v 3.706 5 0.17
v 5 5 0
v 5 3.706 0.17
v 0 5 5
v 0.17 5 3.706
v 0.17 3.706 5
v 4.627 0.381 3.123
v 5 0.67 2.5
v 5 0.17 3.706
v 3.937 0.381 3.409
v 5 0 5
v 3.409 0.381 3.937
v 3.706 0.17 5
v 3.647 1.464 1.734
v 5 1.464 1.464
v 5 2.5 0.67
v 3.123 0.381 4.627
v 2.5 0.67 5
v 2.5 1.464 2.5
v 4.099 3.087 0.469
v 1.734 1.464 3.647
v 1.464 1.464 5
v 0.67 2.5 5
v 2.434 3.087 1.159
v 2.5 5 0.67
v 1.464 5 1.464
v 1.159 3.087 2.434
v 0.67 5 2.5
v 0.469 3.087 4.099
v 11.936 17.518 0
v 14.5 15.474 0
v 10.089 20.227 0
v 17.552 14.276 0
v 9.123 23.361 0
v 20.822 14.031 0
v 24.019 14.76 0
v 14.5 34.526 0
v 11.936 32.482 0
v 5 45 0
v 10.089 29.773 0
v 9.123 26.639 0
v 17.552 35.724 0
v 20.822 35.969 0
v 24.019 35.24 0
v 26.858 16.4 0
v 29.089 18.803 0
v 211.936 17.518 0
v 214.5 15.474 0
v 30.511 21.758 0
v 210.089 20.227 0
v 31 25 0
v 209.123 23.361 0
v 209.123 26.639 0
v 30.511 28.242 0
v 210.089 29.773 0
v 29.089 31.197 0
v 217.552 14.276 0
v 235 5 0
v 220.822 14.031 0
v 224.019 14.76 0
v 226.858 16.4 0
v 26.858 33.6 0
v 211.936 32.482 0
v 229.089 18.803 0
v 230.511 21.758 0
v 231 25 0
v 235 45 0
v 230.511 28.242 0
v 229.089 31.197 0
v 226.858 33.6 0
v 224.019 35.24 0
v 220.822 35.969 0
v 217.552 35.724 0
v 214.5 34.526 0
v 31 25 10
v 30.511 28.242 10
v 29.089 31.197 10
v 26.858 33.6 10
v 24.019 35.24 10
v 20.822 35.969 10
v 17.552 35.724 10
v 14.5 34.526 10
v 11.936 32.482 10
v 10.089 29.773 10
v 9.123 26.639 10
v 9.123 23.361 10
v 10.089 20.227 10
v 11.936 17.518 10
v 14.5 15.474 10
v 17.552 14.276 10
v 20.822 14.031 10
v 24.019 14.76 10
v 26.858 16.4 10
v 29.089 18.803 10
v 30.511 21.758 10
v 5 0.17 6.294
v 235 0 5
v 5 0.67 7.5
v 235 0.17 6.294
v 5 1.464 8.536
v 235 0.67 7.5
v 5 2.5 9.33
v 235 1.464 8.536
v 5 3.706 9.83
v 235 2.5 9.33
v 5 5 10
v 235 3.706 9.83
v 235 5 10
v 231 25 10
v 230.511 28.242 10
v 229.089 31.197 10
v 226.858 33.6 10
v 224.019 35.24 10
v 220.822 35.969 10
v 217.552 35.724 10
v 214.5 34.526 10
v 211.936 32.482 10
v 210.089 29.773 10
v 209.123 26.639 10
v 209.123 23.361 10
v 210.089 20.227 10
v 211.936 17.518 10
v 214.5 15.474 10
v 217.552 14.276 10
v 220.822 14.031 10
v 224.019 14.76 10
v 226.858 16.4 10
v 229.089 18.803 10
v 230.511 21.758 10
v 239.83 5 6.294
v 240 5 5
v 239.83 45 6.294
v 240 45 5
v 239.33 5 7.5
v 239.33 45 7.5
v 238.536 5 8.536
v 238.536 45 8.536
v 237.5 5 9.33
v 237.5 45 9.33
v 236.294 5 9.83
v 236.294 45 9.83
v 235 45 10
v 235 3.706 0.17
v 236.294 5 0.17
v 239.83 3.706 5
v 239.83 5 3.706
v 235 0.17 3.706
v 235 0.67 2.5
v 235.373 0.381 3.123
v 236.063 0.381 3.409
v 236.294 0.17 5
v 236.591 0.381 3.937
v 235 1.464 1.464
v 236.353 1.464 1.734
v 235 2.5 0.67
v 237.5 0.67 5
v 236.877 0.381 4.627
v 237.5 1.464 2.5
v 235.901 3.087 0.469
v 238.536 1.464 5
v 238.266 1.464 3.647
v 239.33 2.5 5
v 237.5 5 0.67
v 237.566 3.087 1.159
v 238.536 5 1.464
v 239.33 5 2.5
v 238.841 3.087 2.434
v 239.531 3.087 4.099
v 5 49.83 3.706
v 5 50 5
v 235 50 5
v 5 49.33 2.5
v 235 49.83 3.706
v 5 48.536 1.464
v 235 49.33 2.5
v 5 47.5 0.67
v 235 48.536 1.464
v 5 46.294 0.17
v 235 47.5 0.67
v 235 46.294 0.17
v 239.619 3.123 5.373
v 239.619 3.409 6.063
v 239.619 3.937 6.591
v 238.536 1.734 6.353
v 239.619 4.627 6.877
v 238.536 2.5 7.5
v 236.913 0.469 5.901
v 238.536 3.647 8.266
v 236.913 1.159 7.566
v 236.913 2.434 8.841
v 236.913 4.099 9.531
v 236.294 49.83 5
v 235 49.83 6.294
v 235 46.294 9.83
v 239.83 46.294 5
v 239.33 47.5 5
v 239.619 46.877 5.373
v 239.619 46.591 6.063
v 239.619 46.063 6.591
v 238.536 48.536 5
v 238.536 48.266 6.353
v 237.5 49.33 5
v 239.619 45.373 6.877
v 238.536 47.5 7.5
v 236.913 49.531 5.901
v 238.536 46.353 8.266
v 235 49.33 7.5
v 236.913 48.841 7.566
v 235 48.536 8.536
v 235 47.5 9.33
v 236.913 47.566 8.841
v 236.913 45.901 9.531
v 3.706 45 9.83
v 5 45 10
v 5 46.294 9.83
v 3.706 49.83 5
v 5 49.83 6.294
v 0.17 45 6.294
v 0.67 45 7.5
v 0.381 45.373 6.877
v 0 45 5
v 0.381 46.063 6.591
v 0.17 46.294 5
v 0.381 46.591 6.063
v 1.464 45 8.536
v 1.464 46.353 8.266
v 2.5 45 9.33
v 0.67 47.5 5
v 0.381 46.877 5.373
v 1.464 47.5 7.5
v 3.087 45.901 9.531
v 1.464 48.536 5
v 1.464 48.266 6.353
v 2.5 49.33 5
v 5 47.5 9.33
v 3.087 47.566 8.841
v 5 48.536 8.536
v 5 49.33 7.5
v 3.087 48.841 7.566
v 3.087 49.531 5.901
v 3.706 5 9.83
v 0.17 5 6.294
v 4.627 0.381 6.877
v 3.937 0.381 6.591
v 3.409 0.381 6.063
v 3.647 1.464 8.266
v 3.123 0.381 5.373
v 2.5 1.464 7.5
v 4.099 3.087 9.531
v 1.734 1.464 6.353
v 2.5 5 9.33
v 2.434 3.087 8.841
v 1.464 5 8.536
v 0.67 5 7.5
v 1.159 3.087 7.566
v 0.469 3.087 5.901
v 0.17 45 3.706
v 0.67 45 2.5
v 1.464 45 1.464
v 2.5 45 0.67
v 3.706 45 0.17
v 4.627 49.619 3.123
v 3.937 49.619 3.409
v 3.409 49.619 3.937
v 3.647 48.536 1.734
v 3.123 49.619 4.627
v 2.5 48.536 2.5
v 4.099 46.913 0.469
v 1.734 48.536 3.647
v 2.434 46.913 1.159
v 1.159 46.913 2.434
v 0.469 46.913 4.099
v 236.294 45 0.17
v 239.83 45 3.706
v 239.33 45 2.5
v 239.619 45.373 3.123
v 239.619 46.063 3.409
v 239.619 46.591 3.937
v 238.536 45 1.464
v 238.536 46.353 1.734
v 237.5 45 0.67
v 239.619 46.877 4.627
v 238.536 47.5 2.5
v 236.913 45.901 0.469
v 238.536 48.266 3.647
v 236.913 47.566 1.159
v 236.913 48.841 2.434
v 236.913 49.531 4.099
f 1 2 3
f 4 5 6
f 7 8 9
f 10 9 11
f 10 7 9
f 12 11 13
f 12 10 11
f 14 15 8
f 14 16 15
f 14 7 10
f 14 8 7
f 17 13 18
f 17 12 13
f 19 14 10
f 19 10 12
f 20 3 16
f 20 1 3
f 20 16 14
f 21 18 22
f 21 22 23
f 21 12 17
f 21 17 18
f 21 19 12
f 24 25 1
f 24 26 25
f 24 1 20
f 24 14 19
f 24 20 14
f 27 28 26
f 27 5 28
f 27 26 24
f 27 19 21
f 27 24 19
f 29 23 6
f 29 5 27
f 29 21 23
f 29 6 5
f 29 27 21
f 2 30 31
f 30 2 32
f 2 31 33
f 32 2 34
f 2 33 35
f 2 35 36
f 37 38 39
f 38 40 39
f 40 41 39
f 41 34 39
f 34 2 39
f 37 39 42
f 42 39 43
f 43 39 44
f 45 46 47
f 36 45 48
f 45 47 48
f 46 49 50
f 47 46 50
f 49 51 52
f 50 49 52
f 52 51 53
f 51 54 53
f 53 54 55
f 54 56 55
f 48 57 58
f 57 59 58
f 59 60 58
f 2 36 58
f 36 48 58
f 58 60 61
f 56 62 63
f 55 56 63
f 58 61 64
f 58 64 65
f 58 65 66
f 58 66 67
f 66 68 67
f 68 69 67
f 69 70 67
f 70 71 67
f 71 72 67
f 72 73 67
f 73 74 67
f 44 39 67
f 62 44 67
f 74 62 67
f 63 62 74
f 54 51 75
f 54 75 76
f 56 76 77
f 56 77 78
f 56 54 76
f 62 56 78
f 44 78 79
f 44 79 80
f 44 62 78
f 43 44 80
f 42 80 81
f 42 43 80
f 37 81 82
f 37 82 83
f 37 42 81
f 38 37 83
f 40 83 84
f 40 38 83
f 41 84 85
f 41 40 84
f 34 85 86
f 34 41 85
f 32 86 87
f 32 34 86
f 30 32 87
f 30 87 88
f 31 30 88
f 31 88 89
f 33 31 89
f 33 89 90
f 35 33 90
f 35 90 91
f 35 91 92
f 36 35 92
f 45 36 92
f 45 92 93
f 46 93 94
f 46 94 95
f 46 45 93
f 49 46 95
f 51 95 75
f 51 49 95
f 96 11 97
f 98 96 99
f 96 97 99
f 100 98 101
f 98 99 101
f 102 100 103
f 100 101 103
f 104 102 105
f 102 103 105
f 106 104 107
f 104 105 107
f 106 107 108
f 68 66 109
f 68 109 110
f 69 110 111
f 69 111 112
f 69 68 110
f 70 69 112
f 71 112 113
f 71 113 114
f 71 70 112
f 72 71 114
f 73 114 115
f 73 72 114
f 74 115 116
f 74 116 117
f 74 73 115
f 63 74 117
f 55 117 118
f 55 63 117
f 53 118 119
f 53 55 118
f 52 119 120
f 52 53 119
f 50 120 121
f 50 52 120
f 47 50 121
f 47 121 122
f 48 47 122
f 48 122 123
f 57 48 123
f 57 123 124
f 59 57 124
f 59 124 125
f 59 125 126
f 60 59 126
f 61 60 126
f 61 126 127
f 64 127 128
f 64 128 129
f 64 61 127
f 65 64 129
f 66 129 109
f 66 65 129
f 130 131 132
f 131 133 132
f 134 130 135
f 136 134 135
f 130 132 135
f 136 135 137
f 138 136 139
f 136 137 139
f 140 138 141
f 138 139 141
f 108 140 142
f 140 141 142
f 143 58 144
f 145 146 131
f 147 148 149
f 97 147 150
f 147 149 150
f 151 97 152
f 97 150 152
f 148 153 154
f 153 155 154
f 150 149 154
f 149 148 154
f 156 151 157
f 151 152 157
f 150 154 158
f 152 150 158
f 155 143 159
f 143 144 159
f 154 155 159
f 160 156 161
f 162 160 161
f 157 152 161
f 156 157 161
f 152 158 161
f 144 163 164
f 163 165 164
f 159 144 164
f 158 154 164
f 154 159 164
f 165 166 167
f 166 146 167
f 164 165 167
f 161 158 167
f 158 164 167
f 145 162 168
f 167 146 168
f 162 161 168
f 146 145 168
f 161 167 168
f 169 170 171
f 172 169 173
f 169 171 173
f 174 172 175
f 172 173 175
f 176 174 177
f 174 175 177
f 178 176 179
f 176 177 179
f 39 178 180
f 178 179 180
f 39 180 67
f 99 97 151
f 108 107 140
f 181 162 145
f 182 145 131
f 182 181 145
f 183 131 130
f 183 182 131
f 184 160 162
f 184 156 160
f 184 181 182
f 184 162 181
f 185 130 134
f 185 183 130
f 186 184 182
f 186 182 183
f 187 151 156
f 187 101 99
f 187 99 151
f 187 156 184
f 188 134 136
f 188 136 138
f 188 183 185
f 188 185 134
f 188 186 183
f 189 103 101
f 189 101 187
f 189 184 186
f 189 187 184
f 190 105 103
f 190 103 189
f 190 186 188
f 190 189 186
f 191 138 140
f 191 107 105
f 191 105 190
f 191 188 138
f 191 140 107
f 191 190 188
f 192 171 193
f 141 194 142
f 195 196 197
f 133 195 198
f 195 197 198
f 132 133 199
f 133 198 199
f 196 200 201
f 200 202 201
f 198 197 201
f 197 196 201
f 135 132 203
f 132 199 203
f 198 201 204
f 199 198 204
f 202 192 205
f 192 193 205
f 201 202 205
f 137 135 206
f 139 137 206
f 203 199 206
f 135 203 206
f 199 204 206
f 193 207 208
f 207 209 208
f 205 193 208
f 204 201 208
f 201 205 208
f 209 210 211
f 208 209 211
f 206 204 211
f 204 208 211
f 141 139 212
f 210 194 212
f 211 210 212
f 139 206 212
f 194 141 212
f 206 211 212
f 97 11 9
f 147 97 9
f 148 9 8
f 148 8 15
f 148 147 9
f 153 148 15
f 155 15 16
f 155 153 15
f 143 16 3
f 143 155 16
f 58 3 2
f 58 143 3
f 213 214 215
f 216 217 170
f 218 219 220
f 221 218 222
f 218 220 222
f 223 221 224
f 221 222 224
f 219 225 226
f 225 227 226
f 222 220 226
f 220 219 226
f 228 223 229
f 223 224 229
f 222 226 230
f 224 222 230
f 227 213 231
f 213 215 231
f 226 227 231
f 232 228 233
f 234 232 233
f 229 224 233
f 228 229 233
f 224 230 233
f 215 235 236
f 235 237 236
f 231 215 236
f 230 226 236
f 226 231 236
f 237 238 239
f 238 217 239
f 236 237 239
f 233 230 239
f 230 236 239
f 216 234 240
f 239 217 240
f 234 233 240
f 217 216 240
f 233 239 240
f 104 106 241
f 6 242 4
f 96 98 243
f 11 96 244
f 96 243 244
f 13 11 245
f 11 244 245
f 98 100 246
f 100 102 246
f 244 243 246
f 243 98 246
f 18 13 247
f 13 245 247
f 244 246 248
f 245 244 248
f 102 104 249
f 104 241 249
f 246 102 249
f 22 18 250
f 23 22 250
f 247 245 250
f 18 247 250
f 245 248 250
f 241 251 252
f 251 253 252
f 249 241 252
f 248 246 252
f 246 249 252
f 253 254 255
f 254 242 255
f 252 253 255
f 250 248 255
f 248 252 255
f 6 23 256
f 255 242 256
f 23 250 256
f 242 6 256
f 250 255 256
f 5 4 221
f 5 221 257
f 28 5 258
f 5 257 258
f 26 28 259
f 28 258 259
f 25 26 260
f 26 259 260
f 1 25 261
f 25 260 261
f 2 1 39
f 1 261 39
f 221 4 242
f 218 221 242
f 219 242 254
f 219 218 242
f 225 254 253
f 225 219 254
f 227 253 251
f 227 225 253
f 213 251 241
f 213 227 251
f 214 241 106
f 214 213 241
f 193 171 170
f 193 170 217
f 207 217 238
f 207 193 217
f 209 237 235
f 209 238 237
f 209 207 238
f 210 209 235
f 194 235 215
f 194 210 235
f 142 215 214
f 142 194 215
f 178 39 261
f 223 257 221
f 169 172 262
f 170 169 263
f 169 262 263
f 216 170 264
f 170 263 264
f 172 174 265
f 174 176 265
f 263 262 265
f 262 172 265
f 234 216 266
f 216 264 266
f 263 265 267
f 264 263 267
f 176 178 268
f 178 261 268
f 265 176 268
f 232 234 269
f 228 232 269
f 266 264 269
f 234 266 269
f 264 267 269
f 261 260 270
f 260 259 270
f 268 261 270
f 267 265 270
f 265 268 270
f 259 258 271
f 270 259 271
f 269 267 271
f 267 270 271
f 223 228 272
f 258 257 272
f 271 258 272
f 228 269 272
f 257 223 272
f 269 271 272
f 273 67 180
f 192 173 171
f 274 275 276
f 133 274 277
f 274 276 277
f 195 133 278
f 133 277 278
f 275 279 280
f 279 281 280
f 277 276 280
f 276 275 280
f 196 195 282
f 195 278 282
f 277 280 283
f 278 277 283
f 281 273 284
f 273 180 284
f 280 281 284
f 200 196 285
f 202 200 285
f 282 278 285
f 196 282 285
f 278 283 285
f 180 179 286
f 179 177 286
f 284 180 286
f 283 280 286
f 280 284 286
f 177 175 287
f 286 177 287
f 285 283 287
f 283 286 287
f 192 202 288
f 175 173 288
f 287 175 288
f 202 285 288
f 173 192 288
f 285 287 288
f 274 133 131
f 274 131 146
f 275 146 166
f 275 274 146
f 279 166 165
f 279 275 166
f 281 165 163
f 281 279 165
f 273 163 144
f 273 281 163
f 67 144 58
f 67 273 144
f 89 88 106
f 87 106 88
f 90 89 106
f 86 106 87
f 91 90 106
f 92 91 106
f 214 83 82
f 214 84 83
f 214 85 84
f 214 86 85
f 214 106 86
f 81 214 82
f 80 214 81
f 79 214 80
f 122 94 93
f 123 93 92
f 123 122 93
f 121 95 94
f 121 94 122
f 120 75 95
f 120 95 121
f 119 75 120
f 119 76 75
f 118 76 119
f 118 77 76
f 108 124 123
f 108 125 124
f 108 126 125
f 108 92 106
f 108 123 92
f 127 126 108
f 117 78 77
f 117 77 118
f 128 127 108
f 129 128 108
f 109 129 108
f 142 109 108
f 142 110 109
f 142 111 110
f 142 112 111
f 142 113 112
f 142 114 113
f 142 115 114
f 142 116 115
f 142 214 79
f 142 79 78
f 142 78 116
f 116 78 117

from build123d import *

# Parameters (mm, degrees)
ESBO_O1_W                = 240
ESBO_O1_H                = 50
ESBO_O1_R                = 11
RESSALTO_EXTRUS_O1_DEPTH = 10
FILETE1_R                = 5


with BuildPart() as part:
    # Esboço1 → Ressalto-extrusão1 (new body)
    with BuildSketch(Plane.XY):
        with Locations((120, 25)):
            Rectangle(ESBO_O1_W, ESBO_O1_H)
        with Locations((20, 25)):
            Circle(ESBO_O1_R, mode=Mode.SUBTRACT)
        with Locations((220, 25)):
            Circle(ESBO_O1_R, mode=Mode.SUBTRACT)
    extrude(amount=RESSALTO_EXTRUS_O1_DEPTH)

    # Filete1
    filete1_edges = [part.edges().sort_by_distance(p)[0] for p in [
        (120, 50, 10),
        (0, 25, 10),
        (120, 0, 10),
        (0, 25, 0),
        (120, 50, 0),
        (240, 25, 0),
        (120, 0, 0),
        (0, 0, 5),
        (0, 50, 5),
        (240, 50, 5),
        (240, 0, 5),
        (240, 25, 10),
    ]]
    fillet(filete1_edges, radius=FILETE1_R - 0.0001)  # a hair under: the kernel refuses the full size


solid = part.part
